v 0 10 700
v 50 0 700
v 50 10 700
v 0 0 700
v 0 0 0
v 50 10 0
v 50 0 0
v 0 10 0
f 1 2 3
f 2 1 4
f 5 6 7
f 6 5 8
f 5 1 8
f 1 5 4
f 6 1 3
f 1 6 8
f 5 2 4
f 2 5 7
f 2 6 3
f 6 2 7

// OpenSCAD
difference()
{
  cube([350, 10, 700]);
  translate([50, 0, 0]) cube([350, 10, 700]);
  translate([100, 0, 0]) cube([350, 10, 700]);
  translate([150, 0, 0]) cube([350, 10, 700]);
  translate([200, 0, 0]) cube([350, 10, 700]);
  translate([250, 0, 0]) cube([350, 10, 700]);
  translate([300, 0, 0]) cube([350, 10, 700]);
  translate([350, 0, 0]) cube([350, 10, 700]);
}
